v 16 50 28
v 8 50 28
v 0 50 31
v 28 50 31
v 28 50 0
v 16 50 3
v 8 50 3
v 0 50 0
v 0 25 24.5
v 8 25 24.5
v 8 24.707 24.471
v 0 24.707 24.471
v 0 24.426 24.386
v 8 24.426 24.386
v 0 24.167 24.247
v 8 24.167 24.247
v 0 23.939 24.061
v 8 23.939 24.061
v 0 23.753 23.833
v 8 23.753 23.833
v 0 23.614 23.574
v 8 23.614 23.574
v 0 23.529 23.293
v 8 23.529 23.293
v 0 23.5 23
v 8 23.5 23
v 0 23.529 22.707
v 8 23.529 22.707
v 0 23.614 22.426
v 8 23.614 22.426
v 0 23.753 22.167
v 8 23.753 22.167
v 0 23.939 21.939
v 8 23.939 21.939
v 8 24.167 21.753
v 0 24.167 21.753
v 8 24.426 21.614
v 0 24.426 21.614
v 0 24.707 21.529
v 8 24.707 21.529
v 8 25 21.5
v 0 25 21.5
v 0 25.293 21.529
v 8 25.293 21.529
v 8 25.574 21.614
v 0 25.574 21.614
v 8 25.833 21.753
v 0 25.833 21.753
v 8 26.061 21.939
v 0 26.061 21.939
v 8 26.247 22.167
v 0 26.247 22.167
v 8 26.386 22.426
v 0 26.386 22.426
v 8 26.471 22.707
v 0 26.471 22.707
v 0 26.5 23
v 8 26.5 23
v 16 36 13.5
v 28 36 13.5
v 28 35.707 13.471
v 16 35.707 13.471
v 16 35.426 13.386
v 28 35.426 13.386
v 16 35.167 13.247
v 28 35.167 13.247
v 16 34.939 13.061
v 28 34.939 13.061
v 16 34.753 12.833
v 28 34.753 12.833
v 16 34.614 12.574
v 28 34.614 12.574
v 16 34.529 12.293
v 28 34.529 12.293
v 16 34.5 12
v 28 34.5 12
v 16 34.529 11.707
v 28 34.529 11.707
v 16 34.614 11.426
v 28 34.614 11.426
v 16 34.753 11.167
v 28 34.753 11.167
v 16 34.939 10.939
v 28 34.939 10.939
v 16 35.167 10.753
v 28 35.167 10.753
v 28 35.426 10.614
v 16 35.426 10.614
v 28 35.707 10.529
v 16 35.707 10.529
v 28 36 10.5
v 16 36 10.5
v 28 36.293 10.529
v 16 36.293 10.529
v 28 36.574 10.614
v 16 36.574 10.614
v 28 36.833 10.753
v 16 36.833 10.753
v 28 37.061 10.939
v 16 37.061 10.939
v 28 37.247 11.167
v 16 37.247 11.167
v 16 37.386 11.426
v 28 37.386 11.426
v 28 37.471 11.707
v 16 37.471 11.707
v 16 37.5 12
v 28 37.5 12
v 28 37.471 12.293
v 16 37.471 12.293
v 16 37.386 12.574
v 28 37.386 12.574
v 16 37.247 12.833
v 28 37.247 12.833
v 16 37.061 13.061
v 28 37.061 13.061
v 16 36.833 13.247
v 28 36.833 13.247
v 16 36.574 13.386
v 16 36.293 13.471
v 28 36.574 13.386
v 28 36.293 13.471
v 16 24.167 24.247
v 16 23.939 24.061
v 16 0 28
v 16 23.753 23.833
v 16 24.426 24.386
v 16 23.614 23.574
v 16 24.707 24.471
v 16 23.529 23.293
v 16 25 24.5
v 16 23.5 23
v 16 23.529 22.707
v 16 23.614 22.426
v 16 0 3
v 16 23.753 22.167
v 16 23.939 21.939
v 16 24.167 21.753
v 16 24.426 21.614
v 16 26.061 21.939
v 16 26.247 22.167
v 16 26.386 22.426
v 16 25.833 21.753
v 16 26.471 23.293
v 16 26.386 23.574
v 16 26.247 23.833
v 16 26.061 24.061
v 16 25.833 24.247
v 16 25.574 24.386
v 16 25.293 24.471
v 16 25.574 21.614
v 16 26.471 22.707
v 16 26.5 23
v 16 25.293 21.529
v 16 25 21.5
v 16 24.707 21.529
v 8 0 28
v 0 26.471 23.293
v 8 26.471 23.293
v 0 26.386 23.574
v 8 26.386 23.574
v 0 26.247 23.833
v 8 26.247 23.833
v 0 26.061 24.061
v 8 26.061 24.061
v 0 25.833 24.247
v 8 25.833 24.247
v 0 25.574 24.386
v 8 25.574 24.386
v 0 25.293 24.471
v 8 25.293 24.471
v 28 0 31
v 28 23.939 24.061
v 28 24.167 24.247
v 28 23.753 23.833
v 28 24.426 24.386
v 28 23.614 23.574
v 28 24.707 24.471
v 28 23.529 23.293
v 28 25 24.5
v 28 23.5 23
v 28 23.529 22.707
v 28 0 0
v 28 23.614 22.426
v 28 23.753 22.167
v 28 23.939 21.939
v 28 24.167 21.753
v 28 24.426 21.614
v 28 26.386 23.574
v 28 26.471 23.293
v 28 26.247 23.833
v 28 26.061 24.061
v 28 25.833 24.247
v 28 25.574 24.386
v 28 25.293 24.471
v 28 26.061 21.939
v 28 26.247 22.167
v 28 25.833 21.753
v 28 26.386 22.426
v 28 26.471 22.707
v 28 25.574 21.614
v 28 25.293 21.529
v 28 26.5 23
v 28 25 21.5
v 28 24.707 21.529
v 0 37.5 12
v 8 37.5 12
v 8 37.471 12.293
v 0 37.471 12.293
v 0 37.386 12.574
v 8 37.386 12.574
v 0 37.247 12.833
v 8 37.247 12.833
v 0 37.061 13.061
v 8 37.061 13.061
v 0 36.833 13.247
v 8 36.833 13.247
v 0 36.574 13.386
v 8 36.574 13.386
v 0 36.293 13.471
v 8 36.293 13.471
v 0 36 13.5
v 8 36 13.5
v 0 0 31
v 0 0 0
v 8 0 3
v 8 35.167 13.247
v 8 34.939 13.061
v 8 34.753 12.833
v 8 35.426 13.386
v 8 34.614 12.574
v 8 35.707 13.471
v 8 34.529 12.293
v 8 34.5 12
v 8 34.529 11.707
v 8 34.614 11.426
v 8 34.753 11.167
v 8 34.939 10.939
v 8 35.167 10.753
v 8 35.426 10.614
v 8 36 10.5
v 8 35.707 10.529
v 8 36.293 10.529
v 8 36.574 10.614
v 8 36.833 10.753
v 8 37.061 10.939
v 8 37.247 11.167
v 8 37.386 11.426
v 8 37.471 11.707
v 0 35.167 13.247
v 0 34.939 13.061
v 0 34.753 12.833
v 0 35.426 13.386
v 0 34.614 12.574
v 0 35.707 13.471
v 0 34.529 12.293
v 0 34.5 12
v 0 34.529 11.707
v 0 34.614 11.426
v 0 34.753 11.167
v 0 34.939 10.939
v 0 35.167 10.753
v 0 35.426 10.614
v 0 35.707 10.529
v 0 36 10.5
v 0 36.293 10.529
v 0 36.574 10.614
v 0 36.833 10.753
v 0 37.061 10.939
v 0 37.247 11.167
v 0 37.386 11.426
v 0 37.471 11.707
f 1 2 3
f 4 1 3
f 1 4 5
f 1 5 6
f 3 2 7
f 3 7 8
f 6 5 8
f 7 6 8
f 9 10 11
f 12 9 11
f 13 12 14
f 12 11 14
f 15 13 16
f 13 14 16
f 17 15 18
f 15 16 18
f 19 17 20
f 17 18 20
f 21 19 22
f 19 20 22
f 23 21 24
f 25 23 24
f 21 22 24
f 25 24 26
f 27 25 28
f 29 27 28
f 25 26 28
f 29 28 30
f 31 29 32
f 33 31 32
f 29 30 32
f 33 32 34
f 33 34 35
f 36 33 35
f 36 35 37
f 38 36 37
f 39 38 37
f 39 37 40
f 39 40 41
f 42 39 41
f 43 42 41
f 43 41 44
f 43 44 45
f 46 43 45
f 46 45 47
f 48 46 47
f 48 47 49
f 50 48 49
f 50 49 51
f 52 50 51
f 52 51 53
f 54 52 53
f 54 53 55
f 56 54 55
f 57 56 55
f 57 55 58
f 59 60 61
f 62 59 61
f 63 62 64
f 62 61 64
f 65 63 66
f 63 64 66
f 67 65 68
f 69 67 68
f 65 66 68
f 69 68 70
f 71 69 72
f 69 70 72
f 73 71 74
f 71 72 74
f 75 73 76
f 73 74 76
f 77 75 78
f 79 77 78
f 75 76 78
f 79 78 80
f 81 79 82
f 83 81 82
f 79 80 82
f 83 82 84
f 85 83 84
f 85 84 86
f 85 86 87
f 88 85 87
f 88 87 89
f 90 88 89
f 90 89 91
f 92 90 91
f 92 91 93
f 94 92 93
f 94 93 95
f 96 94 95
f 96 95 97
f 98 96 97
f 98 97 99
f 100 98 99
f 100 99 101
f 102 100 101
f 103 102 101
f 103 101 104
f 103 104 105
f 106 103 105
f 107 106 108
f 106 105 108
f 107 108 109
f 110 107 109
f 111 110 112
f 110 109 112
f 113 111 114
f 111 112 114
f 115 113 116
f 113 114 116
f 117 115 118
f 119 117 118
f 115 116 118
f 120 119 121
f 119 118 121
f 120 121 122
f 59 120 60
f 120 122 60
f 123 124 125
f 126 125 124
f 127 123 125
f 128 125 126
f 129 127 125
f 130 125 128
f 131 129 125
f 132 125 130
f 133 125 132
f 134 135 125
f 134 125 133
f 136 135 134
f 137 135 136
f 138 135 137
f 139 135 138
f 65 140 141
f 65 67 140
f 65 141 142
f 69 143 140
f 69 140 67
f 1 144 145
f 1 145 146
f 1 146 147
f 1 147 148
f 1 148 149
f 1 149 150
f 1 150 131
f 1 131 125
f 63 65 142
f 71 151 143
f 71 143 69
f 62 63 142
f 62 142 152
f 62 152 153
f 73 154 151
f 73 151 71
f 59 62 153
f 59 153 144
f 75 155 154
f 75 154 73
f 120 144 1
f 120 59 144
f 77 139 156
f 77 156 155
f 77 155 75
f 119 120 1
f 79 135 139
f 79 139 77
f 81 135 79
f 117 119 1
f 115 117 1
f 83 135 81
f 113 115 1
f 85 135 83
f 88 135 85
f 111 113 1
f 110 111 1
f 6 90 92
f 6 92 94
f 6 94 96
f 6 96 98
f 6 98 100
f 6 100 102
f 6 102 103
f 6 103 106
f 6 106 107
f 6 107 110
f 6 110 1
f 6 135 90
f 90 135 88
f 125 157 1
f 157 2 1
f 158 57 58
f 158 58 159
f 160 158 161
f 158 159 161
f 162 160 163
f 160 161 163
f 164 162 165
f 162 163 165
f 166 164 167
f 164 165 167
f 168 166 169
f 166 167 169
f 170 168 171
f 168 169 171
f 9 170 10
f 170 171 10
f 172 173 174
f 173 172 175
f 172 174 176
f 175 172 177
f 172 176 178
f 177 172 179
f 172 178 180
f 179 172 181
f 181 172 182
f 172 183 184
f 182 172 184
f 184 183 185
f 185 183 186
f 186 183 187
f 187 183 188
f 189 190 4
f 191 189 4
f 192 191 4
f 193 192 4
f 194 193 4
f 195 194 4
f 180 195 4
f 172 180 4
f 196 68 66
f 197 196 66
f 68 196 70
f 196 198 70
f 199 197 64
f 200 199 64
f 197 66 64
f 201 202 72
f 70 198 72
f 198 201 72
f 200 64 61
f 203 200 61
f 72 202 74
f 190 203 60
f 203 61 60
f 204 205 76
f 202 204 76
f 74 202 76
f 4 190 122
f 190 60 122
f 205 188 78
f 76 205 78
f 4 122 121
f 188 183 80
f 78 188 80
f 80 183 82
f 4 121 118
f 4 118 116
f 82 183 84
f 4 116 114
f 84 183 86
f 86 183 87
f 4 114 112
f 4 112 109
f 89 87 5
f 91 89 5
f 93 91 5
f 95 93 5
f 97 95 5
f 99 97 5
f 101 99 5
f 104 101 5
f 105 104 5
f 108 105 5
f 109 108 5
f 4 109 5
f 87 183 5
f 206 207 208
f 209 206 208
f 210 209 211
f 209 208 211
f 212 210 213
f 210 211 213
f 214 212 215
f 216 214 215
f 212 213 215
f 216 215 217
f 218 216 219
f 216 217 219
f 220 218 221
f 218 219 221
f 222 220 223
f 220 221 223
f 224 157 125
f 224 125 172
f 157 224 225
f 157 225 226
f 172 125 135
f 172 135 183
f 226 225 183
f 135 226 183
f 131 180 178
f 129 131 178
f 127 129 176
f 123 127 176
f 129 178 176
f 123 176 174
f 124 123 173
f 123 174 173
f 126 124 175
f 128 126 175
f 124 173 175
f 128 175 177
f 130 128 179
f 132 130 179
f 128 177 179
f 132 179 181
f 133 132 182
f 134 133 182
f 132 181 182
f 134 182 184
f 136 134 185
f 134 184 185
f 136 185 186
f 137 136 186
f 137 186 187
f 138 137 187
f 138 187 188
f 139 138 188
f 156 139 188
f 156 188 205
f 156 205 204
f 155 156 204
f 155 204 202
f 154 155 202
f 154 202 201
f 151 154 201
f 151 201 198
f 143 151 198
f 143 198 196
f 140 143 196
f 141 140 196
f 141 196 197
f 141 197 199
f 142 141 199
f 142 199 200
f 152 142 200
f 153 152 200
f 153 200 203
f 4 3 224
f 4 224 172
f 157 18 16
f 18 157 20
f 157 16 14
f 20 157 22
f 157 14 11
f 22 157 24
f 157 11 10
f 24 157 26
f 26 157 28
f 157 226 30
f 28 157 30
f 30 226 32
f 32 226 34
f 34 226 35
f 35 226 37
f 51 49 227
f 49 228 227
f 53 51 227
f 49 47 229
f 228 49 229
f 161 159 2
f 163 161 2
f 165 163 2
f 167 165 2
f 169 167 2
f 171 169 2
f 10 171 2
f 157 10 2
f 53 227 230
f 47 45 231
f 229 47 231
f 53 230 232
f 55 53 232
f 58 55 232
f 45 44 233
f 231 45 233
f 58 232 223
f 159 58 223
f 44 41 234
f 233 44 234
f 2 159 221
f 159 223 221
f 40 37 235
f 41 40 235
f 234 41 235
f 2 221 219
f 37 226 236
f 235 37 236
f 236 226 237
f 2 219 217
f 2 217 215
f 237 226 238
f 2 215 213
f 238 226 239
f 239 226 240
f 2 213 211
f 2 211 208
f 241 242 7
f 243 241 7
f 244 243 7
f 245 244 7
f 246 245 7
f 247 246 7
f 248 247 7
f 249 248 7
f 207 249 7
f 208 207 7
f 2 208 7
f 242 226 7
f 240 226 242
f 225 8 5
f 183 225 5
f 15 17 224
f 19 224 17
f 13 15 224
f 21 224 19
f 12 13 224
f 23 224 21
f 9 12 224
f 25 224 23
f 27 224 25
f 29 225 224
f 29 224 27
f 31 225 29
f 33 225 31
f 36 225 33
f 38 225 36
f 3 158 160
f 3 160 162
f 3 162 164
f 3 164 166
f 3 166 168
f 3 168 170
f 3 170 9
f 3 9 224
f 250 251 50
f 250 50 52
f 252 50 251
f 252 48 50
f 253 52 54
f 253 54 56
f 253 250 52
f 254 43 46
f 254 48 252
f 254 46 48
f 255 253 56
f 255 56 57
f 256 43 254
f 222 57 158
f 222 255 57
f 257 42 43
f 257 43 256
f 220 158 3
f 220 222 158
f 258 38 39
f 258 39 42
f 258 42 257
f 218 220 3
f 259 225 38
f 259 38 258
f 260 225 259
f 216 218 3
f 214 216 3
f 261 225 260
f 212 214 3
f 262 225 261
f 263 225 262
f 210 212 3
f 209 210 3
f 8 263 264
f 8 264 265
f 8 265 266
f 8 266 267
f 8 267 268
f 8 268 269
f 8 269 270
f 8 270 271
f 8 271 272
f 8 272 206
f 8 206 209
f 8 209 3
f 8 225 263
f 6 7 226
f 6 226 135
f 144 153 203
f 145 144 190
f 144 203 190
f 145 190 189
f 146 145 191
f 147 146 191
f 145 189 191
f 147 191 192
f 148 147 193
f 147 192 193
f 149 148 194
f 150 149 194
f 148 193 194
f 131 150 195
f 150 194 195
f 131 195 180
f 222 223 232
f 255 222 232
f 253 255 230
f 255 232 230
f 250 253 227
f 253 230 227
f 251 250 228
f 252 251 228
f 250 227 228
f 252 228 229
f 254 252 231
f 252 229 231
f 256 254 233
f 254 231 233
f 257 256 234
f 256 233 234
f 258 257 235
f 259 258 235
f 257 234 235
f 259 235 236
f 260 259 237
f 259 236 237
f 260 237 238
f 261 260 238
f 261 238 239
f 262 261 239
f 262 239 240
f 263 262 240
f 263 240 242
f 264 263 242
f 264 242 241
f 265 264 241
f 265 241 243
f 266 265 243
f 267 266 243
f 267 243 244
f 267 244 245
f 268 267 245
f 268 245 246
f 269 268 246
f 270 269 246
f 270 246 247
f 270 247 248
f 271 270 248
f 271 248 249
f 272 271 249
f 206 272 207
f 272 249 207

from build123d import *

# Parameters (mm, degrees)
F0_W     = 28
F0_H     = 50
F1_DEPTH = 3
F2_W     = 8
F2_H     = 50
F2_W_2   = 12
F3_DEPTH = 25
F4_W     = 20
F4_H     = 50
F4_W_2   = 8
F5_DEPTH = 3
F7_DEPTH = 67.4


with BuildPart() as f1:
    # F0 (on Top) → F1 (new body)
    with BuildSketch(Plane.XY):
        with Locations((14, 25)):
            Rectangle(F0_W, F0_H)
    extrude(amount=F1_DEPTH)

    # F2 (on face) → F3 (join)
    with BuildSketch(Plane.XY.offset(3)):
        with Locations((4, 25)):
            Rectangle(F2_W, F2_H)
        with Locations((22, 25)):
            Rectangle(F2_W_2, F2_H)
    extrude(amount=F3_DEPTH)

    # F4 (on face) → F5 (join)
    with BuildSketch(Plane.XY.offset(28)):
        with Locations((18, 25)):
            Rectangle(F4_W, F4_H)
        with Locations((4, 25)):
            Rectangle(F4_W_2, F4_H)
    extrude(amount=F5_DEPTH)

    # F6 (on face) → F7 (cut)
    with BuildSketch(Plane.YZ.offset(28)):
        with BuildLine():
            ThreePointArc((26.5, 23), (26.06066, 24.06066), (25, 24.5))
            ThreePointArc((25, 24.5), (23.93934, 21.93934), (26.5, 23))
        make_face()
        with BuildLine():
            ThreePointArc((37.5, 12), (37.06066, 13.06066), (36, 13.5))
            ThreePointArc((36, 13.5), (34.93934, 10.93934), (37.5, 12))
        make_face()
    extrude(amount=-F7_DEPTH, mode=Mode.SUBTRACT)


solid = f1.part
